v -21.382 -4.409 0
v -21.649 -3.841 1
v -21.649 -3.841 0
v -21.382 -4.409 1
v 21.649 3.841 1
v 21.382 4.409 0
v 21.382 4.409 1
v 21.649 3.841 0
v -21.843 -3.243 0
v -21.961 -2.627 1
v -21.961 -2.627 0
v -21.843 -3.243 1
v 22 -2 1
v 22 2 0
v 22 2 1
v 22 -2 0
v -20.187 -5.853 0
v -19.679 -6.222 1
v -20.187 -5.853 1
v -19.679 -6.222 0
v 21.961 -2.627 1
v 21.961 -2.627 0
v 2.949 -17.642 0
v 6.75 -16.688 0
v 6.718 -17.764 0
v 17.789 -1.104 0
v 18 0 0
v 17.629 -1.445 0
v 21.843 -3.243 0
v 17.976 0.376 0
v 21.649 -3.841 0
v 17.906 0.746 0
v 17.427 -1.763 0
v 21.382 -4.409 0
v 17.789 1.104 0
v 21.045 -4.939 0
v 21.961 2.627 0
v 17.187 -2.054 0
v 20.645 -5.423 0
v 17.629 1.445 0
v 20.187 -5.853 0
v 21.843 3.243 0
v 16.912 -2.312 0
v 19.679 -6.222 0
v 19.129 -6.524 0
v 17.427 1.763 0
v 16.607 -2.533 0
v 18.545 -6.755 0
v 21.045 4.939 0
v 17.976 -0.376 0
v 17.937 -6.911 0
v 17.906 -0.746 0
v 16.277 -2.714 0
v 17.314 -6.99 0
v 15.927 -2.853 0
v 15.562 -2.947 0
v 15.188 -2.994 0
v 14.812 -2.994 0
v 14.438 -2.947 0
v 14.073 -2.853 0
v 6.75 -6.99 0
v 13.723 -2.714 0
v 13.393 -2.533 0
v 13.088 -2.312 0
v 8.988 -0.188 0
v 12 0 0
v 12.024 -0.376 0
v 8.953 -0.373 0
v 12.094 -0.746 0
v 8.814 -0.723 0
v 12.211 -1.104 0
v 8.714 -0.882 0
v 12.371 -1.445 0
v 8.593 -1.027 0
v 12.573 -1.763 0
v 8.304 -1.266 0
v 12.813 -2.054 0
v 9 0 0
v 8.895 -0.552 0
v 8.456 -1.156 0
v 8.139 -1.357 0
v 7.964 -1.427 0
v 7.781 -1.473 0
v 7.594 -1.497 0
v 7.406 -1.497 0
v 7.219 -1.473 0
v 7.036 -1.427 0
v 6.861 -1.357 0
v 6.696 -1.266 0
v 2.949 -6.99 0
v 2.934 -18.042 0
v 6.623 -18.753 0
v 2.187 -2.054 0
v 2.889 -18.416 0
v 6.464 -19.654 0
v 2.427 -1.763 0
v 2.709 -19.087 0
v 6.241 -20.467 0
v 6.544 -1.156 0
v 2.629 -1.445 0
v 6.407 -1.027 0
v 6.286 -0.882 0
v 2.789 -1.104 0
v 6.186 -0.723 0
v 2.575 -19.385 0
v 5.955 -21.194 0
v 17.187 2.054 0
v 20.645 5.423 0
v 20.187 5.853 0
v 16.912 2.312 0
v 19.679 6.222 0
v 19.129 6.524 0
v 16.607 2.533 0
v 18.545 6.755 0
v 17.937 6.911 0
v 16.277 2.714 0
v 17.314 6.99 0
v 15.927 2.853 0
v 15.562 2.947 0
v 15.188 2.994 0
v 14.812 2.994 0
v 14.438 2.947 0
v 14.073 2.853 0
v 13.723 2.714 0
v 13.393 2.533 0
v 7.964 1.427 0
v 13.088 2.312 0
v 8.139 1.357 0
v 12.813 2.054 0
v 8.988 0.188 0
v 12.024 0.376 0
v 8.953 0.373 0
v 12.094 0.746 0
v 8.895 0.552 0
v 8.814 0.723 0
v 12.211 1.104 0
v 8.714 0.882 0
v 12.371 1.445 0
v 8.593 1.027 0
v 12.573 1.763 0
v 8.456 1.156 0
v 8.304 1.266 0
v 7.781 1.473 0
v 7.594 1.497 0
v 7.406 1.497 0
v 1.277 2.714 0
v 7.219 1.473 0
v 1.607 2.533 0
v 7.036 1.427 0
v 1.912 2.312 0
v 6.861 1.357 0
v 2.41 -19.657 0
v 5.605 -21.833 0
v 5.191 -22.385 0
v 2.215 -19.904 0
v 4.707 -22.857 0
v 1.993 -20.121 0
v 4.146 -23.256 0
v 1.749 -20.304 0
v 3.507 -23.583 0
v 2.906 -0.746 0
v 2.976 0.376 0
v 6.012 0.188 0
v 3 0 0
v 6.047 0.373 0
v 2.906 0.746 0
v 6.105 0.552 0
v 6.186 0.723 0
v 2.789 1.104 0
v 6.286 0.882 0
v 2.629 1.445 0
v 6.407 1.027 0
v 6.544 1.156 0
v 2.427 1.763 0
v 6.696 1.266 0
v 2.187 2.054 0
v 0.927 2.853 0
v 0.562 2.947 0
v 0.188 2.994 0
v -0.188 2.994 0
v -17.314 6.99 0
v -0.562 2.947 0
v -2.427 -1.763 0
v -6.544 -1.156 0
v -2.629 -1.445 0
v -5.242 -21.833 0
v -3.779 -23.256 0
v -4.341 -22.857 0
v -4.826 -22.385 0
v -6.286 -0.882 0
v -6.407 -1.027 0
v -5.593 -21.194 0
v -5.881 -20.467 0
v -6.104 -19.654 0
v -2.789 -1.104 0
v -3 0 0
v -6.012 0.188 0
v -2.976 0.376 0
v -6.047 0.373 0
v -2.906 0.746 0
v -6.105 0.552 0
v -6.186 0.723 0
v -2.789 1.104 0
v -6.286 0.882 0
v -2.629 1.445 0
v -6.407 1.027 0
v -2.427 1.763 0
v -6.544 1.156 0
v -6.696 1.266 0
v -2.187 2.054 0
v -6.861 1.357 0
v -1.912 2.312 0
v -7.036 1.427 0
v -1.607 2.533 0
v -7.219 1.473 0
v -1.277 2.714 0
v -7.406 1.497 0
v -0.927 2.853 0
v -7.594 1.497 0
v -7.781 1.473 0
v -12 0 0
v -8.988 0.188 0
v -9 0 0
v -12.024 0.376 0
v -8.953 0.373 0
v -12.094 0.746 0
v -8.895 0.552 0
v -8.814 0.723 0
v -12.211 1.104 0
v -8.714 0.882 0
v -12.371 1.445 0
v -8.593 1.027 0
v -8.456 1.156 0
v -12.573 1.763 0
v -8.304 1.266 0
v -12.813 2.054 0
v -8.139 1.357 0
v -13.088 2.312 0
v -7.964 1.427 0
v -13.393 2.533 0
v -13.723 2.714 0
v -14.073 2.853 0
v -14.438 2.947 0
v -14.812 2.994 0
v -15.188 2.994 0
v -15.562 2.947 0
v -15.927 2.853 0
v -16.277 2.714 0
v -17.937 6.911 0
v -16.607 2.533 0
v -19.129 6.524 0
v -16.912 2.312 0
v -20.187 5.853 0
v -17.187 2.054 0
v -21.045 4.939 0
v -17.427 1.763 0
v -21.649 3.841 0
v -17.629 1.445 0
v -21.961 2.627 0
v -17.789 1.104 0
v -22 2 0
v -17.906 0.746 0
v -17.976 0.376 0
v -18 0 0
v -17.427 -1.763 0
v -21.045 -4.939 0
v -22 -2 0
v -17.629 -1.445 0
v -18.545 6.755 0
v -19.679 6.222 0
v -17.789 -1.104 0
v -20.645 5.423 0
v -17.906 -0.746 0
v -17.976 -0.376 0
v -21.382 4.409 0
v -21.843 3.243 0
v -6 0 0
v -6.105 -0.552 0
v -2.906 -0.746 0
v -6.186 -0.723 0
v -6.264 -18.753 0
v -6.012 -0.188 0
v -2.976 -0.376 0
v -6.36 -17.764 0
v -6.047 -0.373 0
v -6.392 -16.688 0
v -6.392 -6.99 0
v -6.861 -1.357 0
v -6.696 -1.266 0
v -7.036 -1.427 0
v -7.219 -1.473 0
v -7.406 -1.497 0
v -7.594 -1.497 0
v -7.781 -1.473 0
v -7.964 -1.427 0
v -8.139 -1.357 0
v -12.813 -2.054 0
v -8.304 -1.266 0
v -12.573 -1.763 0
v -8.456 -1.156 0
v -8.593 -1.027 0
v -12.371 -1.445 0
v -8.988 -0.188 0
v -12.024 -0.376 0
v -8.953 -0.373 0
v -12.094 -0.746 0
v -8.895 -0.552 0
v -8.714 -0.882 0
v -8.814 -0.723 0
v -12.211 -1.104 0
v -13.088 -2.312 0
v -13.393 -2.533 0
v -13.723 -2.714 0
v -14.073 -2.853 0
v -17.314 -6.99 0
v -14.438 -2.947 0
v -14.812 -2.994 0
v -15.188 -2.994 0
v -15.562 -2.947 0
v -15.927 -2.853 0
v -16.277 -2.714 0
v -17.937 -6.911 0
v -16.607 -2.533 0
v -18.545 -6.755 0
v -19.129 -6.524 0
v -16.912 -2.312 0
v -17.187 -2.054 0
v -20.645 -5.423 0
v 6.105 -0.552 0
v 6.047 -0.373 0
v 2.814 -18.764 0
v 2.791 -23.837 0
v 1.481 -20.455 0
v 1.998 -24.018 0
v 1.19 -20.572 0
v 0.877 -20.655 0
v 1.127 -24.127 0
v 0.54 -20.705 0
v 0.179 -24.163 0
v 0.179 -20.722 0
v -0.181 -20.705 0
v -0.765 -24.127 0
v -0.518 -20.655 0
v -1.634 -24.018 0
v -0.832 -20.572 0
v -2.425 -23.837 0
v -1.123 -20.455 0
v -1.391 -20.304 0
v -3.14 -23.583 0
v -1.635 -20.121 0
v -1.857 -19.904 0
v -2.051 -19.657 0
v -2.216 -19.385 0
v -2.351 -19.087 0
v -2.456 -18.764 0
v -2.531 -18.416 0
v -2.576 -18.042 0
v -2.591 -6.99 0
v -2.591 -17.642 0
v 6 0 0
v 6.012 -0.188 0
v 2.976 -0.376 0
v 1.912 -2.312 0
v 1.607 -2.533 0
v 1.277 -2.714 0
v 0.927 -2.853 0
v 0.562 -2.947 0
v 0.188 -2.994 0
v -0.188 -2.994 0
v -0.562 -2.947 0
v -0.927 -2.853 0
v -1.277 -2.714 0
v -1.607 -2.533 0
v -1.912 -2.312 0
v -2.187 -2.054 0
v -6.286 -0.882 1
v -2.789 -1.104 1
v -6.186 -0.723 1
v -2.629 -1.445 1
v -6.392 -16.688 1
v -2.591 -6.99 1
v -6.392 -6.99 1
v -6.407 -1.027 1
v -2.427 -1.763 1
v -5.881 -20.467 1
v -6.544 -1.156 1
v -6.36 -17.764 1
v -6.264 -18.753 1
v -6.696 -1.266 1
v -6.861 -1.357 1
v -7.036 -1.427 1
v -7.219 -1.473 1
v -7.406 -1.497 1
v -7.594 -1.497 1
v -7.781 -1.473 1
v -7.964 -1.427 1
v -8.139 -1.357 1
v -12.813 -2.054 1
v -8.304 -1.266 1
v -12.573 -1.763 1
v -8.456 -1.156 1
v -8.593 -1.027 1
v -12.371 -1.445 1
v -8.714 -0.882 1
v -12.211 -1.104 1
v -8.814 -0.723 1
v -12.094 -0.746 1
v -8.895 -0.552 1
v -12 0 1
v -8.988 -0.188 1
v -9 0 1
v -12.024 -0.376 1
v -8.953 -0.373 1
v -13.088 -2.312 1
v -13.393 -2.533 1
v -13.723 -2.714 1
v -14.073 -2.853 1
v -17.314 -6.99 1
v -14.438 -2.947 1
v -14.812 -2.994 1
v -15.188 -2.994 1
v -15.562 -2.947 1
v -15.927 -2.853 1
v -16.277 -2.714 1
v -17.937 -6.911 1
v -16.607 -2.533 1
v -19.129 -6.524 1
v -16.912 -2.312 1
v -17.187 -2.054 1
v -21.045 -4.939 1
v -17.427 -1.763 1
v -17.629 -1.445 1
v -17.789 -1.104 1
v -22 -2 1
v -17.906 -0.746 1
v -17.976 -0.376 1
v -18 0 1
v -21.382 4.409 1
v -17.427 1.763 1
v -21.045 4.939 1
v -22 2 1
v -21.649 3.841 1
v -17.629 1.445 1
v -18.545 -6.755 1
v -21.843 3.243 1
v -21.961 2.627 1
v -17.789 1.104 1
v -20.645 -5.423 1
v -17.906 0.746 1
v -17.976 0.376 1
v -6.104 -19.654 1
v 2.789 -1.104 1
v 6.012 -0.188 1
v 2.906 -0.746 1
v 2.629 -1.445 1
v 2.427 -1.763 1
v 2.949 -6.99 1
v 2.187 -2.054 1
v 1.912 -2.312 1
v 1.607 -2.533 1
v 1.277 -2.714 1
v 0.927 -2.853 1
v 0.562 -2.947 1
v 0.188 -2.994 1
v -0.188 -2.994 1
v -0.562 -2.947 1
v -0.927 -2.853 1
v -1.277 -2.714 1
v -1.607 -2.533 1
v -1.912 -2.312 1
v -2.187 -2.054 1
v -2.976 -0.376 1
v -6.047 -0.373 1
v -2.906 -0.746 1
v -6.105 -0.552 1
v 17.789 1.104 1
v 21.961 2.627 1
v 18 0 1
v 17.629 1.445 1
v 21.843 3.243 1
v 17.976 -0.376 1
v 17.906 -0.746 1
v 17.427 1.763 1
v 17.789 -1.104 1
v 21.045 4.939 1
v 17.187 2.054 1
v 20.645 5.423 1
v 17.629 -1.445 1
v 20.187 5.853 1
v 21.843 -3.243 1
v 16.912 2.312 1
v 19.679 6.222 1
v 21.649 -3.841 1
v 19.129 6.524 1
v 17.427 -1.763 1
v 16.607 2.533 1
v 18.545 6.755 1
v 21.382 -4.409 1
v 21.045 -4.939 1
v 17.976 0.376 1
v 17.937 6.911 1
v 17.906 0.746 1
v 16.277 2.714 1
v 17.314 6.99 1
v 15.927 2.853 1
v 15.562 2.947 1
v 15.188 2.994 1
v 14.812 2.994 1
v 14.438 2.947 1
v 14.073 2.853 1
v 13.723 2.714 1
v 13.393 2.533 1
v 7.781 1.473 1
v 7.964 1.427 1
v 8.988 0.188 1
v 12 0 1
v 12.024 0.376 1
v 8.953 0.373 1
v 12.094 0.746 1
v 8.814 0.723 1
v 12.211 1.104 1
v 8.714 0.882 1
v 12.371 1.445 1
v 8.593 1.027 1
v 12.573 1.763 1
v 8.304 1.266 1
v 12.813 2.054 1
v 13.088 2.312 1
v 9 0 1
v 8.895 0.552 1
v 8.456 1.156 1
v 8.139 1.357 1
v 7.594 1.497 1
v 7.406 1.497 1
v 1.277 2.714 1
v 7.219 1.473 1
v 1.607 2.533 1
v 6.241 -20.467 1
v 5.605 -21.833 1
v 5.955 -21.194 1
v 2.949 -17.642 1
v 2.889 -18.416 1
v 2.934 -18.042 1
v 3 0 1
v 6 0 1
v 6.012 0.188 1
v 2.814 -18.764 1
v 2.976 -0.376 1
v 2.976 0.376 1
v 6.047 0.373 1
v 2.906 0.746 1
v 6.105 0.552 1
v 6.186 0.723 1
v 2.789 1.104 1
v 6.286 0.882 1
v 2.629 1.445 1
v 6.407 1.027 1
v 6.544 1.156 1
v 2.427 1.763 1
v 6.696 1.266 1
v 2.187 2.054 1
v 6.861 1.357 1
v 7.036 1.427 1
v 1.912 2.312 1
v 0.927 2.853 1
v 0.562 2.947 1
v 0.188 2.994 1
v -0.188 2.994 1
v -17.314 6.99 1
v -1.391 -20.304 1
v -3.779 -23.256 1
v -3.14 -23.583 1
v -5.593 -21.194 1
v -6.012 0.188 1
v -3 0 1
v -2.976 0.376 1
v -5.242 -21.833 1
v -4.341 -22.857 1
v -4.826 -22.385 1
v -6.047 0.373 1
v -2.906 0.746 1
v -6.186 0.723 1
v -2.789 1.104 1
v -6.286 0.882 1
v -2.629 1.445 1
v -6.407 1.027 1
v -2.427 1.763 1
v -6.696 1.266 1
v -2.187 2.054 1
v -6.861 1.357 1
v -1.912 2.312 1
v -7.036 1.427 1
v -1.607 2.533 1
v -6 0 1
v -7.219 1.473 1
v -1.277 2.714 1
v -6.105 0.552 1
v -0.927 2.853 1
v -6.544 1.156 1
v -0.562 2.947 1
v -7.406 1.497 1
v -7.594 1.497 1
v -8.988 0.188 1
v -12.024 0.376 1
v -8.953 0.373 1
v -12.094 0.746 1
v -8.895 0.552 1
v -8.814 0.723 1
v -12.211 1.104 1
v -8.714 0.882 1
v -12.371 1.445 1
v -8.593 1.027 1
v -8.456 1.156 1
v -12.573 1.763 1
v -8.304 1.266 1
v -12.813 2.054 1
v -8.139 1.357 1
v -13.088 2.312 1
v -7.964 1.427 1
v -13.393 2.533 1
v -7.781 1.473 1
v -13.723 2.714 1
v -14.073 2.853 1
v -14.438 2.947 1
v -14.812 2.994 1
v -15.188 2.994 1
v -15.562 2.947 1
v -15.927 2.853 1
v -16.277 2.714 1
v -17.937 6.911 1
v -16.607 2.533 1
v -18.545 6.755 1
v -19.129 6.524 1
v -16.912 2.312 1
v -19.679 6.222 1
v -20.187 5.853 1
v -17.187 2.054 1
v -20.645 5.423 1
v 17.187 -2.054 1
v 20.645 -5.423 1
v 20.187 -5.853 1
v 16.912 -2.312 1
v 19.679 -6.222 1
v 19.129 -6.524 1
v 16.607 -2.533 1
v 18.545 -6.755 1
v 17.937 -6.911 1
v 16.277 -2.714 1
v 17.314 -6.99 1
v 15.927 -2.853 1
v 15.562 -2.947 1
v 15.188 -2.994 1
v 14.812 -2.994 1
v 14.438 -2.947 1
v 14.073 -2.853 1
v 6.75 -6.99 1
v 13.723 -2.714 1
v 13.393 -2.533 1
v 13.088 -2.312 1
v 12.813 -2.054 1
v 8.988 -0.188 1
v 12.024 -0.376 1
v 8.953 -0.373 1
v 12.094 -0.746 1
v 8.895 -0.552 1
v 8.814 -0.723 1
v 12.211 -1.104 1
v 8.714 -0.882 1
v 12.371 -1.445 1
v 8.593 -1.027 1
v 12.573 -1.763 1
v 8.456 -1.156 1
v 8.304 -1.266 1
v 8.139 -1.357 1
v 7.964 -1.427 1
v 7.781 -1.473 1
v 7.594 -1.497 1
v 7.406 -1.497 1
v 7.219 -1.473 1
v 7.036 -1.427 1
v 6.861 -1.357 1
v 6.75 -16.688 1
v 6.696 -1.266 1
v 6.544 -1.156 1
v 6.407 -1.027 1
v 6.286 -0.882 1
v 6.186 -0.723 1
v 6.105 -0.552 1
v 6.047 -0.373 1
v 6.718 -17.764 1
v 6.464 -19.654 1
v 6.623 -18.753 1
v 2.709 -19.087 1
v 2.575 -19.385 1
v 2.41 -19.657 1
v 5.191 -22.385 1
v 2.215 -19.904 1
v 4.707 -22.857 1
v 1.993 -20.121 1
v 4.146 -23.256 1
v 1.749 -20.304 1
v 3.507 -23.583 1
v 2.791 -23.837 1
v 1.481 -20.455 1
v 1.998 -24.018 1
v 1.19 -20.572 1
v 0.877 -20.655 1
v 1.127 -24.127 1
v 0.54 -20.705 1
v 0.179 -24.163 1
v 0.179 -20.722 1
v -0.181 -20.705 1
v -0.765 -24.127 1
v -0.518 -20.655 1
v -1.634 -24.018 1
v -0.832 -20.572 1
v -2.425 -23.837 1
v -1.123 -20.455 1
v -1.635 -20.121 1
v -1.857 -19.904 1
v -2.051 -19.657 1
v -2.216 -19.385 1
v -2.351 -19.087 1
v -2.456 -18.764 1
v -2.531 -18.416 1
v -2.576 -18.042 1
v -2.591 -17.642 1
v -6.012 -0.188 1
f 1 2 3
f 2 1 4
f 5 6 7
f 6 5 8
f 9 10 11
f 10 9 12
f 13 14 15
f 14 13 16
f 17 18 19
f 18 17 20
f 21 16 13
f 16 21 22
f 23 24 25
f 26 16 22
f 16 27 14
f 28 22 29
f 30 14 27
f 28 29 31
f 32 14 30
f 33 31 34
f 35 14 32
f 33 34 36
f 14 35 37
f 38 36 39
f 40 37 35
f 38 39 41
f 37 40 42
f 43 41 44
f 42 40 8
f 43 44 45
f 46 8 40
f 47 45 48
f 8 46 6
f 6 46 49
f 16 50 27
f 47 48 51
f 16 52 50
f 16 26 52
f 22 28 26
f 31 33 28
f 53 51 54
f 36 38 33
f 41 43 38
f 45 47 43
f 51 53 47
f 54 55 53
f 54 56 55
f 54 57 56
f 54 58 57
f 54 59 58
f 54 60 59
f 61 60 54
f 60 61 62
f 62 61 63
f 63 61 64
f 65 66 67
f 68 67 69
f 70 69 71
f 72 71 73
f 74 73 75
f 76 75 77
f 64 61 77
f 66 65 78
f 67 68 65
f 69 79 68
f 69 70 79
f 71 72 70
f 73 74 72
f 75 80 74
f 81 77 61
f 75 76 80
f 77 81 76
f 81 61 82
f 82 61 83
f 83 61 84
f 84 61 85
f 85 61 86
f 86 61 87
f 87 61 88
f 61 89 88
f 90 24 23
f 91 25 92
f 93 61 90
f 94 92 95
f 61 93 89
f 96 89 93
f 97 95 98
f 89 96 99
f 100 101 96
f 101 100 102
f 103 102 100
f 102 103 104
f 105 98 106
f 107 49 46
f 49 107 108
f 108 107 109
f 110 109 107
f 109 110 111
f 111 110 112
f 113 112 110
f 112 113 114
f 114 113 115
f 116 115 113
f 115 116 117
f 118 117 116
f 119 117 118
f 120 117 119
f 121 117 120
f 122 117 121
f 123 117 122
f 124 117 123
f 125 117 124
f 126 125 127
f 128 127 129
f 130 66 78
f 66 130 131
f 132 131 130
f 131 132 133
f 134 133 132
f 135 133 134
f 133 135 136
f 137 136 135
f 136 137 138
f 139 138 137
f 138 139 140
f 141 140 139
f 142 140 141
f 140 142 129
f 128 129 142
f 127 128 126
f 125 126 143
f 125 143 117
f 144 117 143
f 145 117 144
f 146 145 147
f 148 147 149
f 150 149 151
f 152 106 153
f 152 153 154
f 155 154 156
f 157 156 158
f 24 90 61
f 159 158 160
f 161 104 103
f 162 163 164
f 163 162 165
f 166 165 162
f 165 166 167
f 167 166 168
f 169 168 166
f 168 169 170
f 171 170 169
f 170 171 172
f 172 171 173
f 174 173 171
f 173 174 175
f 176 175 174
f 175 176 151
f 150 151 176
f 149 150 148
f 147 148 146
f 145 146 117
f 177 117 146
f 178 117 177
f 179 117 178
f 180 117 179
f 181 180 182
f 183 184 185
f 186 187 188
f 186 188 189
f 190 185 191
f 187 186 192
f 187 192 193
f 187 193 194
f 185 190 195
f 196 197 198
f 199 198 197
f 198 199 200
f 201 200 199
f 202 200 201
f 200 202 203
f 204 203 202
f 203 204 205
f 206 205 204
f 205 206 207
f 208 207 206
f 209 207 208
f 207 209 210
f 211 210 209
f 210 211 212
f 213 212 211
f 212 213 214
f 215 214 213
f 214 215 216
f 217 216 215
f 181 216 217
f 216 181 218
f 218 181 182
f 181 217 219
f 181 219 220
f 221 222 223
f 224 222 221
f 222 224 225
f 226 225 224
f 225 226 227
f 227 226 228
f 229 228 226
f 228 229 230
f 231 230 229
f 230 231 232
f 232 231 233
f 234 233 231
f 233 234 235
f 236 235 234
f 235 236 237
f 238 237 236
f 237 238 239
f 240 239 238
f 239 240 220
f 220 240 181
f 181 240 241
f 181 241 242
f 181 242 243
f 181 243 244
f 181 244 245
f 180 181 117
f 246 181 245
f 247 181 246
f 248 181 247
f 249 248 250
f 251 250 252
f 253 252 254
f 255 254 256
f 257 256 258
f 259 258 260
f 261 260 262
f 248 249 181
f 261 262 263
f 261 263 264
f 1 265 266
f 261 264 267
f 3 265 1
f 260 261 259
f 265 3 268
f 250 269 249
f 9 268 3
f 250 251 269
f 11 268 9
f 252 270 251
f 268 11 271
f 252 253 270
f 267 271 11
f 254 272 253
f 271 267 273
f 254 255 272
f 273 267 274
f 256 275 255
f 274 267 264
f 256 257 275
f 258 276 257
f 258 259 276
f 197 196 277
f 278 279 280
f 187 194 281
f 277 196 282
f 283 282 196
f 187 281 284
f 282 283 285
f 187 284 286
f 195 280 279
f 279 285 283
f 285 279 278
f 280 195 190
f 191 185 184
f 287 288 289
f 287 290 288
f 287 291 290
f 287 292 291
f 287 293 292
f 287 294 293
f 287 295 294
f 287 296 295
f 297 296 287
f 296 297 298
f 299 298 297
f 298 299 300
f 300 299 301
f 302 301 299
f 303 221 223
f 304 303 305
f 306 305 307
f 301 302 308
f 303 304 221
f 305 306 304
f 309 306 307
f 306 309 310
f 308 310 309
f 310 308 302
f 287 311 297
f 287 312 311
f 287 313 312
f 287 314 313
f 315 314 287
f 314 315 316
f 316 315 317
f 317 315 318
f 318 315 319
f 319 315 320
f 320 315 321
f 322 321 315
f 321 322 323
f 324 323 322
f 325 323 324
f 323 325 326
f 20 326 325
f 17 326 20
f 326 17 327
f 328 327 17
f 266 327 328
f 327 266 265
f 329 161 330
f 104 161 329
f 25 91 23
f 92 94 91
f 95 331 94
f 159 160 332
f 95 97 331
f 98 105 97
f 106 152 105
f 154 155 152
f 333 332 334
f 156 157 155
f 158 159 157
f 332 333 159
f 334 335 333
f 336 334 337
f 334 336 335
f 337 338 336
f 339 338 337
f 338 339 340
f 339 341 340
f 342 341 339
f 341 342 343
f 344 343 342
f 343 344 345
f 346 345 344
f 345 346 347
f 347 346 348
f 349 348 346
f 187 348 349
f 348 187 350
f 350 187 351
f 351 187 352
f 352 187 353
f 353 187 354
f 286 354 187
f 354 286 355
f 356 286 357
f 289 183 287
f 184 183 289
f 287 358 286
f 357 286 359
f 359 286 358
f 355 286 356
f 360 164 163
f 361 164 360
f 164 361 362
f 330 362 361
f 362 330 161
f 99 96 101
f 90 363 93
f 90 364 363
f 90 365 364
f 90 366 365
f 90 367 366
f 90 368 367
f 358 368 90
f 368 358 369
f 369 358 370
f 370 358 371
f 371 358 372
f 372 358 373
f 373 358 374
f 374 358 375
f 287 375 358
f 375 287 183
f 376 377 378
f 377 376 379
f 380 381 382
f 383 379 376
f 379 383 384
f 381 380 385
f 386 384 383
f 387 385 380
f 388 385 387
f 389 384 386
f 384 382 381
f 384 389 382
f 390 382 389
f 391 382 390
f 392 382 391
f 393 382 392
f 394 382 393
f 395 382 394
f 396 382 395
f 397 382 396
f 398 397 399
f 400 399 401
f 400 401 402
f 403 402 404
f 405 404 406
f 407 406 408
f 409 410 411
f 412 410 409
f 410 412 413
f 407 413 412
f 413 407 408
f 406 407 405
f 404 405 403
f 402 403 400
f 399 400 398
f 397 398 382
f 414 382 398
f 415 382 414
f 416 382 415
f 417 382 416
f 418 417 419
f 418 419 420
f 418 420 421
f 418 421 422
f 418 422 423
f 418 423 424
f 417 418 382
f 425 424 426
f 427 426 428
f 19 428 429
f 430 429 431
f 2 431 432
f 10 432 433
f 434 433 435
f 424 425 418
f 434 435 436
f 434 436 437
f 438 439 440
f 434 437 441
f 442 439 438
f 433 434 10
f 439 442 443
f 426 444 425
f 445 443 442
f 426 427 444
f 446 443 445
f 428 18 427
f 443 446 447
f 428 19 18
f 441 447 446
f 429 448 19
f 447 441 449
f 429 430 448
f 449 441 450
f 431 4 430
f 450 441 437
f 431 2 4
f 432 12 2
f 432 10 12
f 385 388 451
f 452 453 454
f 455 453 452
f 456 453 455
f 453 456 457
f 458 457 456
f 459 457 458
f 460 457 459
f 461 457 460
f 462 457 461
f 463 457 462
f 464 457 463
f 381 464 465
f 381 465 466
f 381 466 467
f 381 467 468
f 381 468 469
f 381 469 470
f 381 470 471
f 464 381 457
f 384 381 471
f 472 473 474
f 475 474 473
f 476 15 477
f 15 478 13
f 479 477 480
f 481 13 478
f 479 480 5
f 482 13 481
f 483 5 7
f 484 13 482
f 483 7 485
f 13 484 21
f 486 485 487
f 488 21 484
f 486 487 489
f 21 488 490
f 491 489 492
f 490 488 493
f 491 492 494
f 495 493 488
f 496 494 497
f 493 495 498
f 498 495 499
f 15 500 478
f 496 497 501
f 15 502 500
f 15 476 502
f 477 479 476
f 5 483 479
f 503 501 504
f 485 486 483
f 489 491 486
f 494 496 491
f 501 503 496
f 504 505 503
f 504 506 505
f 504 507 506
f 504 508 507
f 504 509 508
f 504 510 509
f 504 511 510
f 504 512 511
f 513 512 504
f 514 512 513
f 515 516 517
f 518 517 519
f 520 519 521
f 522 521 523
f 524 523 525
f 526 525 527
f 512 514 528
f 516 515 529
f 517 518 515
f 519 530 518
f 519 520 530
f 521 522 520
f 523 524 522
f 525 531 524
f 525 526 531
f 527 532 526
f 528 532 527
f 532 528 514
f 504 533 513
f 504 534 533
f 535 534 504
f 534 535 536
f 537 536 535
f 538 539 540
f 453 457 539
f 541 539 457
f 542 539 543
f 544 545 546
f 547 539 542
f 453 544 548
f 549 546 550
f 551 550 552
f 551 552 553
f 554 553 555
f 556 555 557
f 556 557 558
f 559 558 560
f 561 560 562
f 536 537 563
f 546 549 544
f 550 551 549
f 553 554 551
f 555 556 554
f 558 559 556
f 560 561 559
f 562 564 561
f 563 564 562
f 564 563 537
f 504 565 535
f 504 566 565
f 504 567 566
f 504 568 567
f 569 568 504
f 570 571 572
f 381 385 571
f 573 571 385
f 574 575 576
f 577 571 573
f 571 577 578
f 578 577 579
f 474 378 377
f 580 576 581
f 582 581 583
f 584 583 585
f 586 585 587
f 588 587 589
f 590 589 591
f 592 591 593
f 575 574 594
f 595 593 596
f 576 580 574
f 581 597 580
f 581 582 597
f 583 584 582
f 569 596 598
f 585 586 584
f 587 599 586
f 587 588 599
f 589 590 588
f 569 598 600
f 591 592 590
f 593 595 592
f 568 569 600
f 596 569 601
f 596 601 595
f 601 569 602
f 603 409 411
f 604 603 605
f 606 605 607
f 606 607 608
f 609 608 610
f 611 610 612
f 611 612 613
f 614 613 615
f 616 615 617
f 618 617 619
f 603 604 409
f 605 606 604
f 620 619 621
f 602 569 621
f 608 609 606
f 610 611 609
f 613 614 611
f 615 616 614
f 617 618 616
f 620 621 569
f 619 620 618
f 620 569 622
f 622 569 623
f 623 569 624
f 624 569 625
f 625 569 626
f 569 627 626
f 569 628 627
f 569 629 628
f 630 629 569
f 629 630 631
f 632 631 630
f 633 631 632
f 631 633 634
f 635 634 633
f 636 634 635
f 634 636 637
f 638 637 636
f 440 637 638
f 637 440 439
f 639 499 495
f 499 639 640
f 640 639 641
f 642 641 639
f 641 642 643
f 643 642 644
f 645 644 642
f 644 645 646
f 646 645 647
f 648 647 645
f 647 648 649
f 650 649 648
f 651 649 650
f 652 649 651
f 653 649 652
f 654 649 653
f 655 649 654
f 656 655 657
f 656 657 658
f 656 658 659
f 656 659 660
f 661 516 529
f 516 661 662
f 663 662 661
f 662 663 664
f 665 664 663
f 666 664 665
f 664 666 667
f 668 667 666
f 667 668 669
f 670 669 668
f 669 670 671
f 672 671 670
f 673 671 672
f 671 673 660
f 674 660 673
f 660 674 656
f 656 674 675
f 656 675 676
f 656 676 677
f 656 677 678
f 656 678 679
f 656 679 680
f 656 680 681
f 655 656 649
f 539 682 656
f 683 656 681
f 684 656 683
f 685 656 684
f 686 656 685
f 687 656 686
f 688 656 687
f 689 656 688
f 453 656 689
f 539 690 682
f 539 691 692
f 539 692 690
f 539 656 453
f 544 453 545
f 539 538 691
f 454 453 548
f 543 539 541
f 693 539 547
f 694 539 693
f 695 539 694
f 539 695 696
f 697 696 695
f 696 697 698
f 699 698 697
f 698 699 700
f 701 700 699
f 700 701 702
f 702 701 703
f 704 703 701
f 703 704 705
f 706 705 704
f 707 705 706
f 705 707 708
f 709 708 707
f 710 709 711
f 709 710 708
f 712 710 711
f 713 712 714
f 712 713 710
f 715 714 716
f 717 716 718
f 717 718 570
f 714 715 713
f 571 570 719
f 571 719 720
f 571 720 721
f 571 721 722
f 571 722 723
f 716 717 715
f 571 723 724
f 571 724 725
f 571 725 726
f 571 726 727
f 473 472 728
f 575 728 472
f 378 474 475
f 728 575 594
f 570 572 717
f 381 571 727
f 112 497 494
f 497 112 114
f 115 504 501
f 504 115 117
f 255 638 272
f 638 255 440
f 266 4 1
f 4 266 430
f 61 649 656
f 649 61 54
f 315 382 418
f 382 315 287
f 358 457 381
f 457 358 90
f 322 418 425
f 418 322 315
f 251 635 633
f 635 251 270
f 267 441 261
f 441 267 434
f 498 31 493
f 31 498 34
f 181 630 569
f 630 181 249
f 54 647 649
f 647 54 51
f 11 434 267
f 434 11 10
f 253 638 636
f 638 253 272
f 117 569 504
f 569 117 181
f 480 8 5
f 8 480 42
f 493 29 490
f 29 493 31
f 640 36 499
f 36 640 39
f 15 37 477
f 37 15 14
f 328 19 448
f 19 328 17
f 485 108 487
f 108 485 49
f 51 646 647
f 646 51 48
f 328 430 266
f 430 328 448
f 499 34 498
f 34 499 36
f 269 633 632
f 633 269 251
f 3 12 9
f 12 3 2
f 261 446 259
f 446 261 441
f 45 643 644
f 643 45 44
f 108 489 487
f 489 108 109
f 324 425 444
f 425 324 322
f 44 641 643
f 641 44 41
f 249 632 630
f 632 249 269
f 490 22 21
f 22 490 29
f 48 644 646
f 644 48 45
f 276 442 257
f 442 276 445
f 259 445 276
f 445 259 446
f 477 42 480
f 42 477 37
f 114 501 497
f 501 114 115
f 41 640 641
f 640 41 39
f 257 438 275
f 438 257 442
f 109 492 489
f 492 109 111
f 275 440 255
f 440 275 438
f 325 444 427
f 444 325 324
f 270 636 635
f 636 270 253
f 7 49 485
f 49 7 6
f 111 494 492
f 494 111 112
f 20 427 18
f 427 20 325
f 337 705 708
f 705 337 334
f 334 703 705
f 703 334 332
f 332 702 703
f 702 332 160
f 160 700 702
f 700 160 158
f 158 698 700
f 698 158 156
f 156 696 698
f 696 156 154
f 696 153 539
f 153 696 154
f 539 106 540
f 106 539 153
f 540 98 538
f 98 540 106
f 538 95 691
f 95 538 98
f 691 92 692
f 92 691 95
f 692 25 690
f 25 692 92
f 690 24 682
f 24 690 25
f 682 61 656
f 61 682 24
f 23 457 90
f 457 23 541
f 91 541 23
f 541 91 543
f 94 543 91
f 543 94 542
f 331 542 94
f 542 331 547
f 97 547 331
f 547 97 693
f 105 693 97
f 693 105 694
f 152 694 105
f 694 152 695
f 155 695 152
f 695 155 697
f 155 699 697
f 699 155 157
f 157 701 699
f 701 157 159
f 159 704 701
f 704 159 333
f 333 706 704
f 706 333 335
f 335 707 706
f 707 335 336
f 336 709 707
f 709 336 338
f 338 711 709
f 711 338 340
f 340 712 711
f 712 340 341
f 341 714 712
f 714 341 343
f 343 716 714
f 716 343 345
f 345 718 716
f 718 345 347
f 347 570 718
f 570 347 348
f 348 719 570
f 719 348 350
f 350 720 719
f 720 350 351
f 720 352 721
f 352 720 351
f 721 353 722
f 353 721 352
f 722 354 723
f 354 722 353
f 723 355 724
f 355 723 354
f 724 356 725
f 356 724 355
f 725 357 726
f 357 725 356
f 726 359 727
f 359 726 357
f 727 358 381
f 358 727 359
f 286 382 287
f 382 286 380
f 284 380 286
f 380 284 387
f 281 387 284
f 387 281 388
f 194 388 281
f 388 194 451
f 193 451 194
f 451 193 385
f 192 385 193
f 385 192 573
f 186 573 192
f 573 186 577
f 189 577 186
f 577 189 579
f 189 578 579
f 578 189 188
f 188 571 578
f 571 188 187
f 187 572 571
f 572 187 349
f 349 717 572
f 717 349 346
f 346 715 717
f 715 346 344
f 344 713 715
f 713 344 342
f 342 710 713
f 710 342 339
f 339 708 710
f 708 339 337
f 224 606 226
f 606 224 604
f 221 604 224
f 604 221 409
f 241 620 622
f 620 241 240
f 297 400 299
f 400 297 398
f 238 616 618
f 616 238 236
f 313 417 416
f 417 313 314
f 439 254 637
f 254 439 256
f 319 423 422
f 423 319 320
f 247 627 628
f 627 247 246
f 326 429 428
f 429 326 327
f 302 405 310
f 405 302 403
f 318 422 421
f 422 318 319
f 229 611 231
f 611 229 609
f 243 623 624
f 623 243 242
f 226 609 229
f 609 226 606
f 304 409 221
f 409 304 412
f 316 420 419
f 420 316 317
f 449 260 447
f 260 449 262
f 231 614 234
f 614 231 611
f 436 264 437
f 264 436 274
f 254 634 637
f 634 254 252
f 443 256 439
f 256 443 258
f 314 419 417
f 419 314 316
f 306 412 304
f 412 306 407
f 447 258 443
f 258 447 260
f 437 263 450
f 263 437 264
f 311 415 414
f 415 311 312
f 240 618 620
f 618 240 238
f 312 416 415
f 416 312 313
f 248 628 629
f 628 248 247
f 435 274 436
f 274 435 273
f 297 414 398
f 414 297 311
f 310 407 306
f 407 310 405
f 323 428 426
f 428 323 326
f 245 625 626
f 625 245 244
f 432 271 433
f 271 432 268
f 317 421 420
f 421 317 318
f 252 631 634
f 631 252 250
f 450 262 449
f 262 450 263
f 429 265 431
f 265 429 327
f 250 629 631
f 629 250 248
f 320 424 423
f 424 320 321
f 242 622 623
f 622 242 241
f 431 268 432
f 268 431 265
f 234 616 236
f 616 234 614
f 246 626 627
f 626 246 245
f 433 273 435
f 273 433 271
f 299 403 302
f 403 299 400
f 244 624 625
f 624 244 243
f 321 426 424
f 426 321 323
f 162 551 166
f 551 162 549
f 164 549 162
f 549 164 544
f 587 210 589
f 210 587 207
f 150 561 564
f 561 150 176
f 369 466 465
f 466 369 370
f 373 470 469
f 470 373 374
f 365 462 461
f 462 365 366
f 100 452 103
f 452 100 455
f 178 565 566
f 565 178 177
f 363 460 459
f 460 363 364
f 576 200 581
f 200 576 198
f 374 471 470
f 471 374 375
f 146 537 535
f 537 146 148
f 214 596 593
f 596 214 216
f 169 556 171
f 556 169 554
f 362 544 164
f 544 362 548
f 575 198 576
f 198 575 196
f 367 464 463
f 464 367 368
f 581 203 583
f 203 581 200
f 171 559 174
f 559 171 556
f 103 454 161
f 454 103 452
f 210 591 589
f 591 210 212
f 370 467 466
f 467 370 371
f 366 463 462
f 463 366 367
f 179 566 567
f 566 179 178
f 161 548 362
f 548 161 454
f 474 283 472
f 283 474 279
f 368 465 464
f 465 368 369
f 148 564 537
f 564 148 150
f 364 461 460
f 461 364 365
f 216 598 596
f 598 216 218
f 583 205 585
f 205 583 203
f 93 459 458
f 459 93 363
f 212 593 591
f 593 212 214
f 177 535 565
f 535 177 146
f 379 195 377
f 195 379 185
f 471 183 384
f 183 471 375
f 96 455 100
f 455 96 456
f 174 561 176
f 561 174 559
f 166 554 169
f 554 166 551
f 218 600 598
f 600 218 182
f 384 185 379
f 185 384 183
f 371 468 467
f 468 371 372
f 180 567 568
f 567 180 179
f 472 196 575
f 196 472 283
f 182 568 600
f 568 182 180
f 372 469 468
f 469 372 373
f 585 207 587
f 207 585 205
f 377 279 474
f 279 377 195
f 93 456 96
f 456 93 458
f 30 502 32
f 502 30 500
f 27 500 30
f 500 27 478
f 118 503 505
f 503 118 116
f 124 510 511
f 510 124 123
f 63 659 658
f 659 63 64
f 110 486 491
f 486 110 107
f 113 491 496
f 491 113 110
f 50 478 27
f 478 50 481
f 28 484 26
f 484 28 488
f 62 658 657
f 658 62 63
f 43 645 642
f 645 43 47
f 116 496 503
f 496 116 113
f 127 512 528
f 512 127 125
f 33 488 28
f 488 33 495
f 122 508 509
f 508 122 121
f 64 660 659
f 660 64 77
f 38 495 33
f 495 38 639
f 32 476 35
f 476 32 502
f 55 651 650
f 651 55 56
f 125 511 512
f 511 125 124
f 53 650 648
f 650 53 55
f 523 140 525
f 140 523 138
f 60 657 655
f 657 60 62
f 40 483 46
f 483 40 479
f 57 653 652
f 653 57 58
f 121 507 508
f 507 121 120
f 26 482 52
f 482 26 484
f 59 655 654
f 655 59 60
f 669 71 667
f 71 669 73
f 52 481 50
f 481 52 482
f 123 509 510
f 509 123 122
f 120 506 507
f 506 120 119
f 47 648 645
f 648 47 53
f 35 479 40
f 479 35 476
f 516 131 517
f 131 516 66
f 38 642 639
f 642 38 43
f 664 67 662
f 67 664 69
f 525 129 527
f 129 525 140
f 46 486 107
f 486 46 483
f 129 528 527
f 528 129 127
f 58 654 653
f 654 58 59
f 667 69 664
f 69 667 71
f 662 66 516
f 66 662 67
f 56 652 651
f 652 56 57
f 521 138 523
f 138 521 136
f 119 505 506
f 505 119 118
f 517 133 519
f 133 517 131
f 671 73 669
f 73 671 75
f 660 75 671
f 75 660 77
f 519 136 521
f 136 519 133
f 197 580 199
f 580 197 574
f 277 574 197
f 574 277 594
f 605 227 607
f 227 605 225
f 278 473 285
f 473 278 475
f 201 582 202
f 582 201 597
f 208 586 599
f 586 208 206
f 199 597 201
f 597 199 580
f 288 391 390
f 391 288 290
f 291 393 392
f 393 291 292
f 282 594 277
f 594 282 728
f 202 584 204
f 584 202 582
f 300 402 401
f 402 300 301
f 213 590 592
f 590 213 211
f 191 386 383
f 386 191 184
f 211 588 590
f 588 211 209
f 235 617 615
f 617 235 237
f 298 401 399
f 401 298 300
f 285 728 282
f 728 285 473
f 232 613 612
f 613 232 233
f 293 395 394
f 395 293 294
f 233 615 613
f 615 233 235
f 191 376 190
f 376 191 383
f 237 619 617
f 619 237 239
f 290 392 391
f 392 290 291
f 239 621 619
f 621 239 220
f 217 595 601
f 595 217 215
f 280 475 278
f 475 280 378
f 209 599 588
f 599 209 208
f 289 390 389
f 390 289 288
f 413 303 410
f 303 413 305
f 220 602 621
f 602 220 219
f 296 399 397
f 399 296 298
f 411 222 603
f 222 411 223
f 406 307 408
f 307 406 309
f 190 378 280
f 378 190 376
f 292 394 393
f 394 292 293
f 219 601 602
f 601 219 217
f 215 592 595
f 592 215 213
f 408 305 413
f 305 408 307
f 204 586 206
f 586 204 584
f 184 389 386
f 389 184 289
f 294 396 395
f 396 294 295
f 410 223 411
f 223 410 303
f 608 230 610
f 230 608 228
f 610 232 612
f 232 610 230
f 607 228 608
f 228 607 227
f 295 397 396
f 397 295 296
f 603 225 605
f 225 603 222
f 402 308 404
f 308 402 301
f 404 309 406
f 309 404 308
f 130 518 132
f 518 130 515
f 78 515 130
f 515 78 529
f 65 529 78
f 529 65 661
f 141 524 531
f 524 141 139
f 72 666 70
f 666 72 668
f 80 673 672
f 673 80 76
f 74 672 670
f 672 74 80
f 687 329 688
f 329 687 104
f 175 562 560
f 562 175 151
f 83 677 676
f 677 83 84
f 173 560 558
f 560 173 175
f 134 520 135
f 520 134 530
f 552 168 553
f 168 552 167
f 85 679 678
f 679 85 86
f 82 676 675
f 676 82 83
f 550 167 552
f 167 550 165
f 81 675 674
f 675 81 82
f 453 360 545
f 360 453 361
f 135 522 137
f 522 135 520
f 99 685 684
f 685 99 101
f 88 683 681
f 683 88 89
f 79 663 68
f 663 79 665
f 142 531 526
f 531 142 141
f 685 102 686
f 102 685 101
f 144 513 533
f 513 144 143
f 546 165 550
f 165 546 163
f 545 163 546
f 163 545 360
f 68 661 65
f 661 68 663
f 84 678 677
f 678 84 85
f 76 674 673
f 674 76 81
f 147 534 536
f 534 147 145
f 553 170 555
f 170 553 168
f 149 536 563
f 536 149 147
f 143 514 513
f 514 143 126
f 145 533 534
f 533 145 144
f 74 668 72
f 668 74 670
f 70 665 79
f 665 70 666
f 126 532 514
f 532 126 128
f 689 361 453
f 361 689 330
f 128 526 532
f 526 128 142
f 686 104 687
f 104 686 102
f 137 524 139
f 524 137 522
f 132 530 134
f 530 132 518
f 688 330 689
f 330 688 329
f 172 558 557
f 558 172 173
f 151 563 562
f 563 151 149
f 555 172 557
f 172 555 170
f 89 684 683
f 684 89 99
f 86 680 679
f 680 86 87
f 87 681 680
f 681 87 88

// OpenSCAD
$fn = 50;


difference() {
	union() {
		hull() {
			translate(v = [-17.0000000000, 2.0000000000, 0]) {
				cylinder(h = 1, r = 5);
			}
			translate(v = [17.0000000000, 2.0000000000, 0]) {
				cylinder(h = 1, r = 5);
			}
			translate(v = [-17.0000000000, -2.0000000000, 0]) {
				cylinder(h = 1, r = 5);
			}
			translate(v = [17.0000000000, -2.0000000000, 0]) {
				cylinder(h = 1, r = 5);
			}
		}
		translate(v = [0, -5, 0]) {
			linear_extrude(height = 1) {
				text(font = "DejaVu Sans Mono:style=Bold", halign = "center", size = 19.0000000000, text = "U", valign = "top");
			}
		}
	}
	union() {
		translate(v = [-15.0000000000, 0.0000000000, 0]) {
			translate(v = [0, 0, -100]) {
				cylinder(h = 200, r = 3.0000000000);
			}
		}
		translate(v = [0, 0, -100]) {
			cylinder(h = 200, r = 3.0000000000);
		}
		translate(v = [15.0000000000, 0.0000000000, 0]) {
			translate(v = [0, 0, -100]) {
				cylinder(h = 200, r = 3.0000000000);
			}
		}
		translate(v = [-15.0000000000, 0.0000000000, 0]) {
			translate(v = [0, 0, -100]) {
				cylinder(h = 200, r = 1.5000000000);
			}
		}
		translate(v = [-7.5000000000, 0.0000000000, 0]) {
			translate(v = [0, 0, -100]) {
				cylinder(h = 200, r = 1.5000000000);
			}
		}
		translate(v = [0, 0, -100]) {
			cylinder(h = 200, r = 1.5000000000);
		}
		translate(v = [7.5000000000, 0.0000000000, 0]) {
			translate(v = [0, 0, -100]) {
				cylinder(h = 200, r = 1.5000000000);
			}
		}
		translate(v = [15.0000000000, 0.0000000000, 0]) {
			translate(v = [0, 0, -100]) {
				cylinder(h = 200, r = 1.5000000000);
			}
		}
	}
}
